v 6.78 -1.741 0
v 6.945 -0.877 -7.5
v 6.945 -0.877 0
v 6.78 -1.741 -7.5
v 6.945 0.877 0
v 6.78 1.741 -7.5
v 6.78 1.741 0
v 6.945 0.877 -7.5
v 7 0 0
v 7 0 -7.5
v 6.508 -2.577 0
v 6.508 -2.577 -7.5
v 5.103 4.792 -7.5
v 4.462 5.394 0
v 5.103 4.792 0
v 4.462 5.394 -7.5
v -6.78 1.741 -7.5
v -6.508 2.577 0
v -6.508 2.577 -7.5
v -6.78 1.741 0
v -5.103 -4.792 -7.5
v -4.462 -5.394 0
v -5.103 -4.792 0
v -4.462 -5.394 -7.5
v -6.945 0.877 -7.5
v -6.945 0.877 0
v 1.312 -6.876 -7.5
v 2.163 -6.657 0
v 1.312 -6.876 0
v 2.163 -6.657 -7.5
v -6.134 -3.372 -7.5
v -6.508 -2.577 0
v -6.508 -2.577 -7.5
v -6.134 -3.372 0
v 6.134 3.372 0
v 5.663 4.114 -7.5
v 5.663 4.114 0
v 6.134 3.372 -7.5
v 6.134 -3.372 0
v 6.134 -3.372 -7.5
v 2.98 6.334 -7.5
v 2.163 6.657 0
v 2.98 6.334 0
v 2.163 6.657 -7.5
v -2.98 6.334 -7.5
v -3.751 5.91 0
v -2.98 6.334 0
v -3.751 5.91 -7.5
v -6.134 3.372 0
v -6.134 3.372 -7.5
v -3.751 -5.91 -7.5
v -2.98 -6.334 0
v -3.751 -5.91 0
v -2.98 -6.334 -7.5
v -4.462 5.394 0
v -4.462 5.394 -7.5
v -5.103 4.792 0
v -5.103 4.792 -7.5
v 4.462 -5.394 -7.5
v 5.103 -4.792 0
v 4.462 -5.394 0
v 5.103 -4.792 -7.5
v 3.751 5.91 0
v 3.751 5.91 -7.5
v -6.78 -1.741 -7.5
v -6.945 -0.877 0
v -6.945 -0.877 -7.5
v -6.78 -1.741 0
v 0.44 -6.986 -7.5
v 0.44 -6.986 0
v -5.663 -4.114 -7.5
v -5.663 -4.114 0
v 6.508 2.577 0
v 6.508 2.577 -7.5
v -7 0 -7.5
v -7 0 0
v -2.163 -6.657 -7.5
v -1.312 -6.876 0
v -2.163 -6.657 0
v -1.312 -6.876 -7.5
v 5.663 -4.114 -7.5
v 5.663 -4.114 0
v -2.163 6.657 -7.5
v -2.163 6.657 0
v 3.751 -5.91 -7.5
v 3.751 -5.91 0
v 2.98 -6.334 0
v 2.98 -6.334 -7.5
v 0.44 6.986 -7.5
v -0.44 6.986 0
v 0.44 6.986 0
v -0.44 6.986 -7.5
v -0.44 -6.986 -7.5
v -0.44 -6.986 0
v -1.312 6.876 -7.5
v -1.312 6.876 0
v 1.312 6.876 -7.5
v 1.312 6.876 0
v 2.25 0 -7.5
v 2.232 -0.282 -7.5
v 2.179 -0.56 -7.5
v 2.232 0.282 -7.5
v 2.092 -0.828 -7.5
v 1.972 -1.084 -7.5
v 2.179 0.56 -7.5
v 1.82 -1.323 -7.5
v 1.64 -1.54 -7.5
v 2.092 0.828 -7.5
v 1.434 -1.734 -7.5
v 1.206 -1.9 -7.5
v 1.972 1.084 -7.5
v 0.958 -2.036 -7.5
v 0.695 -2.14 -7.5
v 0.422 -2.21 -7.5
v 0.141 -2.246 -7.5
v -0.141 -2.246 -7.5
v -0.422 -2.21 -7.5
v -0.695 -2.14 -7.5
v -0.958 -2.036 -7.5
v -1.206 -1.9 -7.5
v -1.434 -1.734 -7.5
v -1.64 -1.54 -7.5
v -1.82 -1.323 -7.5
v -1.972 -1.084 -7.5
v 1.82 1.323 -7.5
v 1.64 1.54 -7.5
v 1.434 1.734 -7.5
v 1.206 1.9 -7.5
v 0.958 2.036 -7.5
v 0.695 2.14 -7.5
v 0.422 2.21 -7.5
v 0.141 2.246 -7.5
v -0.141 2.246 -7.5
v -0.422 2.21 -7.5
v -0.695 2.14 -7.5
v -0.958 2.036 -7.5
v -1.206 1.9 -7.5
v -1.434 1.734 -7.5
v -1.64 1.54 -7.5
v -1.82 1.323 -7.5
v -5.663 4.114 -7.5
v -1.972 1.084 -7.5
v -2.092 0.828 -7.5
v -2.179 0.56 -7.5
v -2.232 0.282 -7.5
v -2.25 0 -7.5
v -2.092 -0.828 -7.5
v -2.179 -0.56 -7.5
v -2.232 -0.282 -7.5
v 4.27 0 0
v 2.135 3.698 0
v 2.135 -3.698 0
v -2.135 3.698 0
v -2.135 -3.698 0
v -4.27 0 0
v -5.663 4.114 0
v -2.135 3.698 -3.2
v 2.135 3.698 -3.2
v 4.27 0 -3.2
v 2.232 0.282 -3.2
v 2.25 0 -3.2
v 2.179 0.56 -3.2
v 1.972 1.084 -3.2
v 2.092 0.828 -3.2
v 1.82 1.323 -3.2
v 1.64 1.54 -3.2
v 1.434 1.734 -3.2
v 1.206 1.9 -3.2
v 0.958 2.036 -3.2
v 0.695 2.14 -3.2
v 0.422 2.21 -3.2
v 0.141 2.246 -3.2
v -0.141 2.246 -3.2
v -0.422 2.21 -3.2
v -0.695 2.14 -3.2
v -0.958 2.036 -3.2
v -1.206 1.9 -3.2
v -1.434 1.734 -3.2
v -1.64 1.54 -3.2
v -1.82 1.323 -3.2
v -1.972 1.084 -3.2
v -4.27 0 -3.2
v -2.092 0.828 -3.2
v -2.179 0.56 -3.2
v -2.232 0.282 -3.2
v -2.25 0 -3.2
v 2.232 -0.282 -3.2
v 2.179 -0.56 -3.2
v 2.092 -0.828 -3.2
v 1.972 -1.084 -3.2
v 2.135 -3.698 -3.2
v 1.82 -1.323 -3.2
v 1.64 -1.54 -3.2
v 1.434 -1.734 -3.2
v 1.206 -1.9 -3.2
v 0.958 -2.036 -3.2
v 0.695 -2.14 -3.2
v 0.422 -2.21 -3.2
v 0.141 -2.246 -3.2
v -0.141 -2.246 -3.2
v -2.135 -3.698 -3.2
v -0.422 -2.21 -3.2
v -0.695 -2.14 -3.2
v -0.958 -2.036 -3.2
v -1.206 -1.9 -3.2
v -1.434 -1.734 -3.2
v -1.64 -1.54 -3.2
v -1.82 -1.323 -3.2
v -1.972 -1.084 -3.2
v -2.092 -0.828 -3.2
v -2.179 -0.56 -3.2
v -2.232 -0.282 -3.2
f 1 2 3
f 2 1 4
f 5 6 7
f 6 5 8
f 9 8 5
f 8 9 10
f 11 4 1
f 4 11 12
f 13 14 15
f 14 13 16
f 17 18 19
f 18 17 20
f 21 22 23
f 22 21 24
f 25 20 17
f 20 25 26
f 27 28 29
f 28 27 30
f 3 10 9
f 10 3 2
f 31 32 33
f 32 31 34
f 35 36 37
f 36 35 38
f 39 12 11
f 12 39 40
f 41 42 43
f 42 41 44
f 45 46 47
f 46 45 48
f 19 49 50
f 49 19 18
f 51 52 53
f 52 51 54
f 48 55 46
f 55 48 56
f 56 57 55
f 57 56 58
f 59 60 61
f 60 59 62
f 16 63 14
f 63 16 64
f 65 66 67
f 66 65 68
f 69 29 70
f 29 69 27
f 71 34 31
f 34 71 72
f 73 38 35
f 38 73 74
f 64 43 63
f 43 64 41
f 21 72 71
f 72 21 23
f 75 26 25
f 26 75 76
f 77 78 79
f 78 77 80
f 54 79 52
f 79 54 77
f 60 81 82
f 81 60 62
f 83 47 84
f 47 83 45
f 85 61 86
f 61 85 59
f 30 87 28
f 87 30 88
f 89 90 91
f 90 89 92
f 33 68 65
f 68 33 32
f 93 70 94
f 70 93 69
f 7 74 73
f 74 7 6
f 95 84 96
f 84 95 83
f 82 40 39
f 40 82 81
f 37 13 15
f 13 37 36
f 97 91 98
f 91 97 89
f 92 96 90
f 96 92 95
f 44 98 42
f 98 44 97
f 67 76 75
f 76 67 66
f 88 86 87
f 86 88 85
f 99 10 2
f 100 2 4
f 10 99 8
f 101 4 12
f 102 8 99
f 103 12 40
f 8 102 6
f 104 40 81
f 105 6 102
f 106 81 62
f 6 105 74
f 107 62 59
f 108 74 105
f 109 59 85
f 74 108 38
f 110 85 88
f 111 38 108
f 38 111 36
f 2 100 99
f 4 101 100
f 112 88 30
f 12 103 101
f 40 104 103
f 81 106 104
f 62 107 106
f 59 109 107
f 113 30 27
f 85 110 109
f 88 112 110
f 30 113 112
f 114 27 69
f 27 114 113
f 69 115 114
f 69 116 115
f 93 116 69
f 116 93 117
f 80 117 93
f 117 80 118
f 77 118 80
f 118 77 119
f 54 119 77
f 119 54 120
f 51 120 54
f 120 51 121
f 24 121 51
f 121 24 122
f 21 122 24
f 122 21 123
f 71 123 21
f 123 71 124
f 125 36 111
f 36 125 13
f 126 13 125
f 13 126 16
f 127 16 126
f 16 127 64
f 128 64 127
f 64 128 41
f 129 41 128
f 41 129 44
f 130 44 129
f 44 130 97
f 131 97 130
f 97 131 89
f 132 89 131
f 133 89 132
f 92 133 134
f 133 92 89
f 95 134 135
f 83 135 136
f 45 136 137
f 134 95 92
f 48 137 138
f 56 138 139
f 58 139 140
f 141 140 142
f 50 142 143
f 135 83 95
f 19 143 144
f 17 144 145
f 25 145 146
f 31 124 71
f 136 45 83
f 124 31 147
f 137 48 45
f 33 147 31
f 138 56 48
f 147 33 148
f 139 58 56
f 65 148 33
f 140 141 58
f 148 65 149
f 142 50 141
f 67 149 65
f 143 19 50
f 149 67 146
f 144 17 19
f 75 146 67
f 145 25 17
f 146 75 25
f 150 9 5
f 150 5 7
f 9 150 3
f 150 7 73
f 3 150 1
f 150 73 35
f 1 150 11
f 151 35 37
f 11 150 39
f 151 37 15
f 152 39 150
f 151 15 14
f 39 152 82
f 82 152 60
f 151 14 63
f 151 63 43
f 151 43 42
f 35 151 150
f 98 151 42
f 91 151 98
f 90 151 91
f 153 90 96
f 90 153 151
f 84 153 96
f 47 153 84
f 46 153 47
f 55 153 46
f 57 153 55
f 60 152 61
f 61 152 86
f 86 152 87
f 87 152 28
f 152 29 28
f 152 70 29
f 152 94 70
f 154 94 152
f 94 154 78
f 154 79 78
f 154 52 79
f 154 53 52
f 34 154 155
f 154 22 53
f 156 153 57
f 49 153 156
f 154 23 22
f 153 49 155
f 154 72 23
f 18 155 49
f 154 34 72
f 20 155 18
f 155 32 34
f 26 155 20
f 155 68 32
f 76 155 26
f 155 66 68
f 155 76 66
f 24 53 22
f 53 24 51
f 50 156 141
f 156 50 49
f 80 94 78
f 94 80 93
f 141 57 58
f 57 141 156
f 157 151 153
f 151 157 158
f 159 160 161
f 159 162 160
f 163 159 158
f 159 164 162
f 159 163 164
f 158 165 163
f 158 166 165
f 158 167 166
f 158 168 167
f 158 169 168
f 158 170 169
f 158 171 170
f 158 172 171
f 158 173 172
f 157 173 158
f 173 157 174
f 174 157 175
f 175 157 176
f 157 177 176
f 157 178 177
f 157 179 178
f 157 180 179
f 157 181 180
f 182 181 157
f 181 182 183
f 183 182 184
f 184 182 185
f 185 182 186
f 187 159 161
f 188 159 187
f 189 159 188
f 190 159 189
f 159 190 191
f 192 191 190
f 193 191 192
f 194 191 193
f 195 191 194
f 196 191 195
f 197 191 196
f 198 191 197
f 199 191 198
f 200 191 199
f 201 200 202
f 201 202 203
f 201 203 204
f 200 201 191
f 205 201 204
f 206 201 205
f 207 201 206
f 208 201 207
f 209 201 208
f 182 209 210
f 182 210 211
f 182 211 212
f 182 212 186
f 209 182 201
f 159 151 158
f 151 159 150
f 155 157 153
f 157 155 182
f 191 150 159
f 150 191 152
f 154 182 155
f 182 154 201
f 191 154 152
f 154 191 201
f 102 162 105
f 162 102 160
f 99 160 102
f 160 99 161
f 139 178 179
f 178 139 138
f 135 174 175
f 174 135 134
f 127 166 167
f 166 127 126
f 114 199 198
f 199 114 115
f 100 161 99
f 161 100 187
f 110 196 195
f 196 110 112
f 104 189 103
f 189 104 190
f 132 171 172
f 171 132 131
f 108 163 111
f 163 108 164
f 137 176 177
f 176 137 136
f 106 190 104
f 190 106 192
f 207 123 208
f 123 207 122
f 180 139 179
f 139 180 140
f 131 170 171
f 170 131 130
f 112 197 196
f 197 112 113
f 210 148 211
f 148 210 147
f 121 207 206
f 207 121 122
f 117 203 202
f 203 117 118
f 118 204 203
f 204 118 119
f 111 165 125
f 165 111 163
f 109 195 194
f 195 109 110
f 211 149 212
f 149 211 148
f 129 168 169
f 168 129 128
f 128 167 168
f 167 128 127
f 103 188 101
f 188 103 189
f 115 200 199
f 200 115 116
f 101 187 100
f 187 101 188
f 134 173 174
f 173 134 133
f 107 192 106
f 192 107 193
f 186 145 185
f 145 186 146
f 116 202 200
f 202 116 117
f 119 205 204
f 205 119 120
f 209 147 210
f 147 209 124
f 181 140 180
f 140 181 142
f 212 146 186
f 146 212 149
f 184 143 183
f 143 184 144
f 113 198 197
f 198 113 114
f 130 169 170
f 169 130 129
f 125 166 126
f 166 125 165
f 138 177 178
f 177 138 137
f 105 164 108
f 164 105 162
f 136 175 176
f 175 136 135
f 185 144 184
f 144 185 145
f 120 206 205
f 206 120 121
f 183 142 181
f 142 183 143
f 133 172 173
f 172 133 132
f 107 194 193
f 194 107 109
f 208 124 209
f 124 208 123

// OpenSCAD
$fn = 50;


difference() {
	union() {
		translate(v = [0, 0, -7.5000000000]) {
			cylinder(h = 7.5000000000, r = 7.0000000000);
		}
		translate(v = [0, 0, -6.0000000000]) {
			cylinder(h = 6, r = 2.8750000000);
		}
	}
	union() {
		translate(v = [0, 0, 0]) {
			rotate(a = [0, 0, 0]) {
				difference() {
					union() {
						translate(v = [0, 0, -3.2000000000]) {
							linear_extrude(height = 3.2000000000) {
								polygon(points = [[4.2698000000, 0.0000000000], [2.1349000000, 3.6977552691], [-2.1349000000, 3.6977552691], [-4.2698000000, 0.0000000000], [-2.1349000000, -3.6977552691], [2.1349000000, -3.6977552691]]);
							}
						}
					}
					union();
				}
			}
		}
		#translate(v = [0, 0, -100.0000000000]) {
			cylinder(h = 200, r = 2.2500000000);
		}
	}
}
